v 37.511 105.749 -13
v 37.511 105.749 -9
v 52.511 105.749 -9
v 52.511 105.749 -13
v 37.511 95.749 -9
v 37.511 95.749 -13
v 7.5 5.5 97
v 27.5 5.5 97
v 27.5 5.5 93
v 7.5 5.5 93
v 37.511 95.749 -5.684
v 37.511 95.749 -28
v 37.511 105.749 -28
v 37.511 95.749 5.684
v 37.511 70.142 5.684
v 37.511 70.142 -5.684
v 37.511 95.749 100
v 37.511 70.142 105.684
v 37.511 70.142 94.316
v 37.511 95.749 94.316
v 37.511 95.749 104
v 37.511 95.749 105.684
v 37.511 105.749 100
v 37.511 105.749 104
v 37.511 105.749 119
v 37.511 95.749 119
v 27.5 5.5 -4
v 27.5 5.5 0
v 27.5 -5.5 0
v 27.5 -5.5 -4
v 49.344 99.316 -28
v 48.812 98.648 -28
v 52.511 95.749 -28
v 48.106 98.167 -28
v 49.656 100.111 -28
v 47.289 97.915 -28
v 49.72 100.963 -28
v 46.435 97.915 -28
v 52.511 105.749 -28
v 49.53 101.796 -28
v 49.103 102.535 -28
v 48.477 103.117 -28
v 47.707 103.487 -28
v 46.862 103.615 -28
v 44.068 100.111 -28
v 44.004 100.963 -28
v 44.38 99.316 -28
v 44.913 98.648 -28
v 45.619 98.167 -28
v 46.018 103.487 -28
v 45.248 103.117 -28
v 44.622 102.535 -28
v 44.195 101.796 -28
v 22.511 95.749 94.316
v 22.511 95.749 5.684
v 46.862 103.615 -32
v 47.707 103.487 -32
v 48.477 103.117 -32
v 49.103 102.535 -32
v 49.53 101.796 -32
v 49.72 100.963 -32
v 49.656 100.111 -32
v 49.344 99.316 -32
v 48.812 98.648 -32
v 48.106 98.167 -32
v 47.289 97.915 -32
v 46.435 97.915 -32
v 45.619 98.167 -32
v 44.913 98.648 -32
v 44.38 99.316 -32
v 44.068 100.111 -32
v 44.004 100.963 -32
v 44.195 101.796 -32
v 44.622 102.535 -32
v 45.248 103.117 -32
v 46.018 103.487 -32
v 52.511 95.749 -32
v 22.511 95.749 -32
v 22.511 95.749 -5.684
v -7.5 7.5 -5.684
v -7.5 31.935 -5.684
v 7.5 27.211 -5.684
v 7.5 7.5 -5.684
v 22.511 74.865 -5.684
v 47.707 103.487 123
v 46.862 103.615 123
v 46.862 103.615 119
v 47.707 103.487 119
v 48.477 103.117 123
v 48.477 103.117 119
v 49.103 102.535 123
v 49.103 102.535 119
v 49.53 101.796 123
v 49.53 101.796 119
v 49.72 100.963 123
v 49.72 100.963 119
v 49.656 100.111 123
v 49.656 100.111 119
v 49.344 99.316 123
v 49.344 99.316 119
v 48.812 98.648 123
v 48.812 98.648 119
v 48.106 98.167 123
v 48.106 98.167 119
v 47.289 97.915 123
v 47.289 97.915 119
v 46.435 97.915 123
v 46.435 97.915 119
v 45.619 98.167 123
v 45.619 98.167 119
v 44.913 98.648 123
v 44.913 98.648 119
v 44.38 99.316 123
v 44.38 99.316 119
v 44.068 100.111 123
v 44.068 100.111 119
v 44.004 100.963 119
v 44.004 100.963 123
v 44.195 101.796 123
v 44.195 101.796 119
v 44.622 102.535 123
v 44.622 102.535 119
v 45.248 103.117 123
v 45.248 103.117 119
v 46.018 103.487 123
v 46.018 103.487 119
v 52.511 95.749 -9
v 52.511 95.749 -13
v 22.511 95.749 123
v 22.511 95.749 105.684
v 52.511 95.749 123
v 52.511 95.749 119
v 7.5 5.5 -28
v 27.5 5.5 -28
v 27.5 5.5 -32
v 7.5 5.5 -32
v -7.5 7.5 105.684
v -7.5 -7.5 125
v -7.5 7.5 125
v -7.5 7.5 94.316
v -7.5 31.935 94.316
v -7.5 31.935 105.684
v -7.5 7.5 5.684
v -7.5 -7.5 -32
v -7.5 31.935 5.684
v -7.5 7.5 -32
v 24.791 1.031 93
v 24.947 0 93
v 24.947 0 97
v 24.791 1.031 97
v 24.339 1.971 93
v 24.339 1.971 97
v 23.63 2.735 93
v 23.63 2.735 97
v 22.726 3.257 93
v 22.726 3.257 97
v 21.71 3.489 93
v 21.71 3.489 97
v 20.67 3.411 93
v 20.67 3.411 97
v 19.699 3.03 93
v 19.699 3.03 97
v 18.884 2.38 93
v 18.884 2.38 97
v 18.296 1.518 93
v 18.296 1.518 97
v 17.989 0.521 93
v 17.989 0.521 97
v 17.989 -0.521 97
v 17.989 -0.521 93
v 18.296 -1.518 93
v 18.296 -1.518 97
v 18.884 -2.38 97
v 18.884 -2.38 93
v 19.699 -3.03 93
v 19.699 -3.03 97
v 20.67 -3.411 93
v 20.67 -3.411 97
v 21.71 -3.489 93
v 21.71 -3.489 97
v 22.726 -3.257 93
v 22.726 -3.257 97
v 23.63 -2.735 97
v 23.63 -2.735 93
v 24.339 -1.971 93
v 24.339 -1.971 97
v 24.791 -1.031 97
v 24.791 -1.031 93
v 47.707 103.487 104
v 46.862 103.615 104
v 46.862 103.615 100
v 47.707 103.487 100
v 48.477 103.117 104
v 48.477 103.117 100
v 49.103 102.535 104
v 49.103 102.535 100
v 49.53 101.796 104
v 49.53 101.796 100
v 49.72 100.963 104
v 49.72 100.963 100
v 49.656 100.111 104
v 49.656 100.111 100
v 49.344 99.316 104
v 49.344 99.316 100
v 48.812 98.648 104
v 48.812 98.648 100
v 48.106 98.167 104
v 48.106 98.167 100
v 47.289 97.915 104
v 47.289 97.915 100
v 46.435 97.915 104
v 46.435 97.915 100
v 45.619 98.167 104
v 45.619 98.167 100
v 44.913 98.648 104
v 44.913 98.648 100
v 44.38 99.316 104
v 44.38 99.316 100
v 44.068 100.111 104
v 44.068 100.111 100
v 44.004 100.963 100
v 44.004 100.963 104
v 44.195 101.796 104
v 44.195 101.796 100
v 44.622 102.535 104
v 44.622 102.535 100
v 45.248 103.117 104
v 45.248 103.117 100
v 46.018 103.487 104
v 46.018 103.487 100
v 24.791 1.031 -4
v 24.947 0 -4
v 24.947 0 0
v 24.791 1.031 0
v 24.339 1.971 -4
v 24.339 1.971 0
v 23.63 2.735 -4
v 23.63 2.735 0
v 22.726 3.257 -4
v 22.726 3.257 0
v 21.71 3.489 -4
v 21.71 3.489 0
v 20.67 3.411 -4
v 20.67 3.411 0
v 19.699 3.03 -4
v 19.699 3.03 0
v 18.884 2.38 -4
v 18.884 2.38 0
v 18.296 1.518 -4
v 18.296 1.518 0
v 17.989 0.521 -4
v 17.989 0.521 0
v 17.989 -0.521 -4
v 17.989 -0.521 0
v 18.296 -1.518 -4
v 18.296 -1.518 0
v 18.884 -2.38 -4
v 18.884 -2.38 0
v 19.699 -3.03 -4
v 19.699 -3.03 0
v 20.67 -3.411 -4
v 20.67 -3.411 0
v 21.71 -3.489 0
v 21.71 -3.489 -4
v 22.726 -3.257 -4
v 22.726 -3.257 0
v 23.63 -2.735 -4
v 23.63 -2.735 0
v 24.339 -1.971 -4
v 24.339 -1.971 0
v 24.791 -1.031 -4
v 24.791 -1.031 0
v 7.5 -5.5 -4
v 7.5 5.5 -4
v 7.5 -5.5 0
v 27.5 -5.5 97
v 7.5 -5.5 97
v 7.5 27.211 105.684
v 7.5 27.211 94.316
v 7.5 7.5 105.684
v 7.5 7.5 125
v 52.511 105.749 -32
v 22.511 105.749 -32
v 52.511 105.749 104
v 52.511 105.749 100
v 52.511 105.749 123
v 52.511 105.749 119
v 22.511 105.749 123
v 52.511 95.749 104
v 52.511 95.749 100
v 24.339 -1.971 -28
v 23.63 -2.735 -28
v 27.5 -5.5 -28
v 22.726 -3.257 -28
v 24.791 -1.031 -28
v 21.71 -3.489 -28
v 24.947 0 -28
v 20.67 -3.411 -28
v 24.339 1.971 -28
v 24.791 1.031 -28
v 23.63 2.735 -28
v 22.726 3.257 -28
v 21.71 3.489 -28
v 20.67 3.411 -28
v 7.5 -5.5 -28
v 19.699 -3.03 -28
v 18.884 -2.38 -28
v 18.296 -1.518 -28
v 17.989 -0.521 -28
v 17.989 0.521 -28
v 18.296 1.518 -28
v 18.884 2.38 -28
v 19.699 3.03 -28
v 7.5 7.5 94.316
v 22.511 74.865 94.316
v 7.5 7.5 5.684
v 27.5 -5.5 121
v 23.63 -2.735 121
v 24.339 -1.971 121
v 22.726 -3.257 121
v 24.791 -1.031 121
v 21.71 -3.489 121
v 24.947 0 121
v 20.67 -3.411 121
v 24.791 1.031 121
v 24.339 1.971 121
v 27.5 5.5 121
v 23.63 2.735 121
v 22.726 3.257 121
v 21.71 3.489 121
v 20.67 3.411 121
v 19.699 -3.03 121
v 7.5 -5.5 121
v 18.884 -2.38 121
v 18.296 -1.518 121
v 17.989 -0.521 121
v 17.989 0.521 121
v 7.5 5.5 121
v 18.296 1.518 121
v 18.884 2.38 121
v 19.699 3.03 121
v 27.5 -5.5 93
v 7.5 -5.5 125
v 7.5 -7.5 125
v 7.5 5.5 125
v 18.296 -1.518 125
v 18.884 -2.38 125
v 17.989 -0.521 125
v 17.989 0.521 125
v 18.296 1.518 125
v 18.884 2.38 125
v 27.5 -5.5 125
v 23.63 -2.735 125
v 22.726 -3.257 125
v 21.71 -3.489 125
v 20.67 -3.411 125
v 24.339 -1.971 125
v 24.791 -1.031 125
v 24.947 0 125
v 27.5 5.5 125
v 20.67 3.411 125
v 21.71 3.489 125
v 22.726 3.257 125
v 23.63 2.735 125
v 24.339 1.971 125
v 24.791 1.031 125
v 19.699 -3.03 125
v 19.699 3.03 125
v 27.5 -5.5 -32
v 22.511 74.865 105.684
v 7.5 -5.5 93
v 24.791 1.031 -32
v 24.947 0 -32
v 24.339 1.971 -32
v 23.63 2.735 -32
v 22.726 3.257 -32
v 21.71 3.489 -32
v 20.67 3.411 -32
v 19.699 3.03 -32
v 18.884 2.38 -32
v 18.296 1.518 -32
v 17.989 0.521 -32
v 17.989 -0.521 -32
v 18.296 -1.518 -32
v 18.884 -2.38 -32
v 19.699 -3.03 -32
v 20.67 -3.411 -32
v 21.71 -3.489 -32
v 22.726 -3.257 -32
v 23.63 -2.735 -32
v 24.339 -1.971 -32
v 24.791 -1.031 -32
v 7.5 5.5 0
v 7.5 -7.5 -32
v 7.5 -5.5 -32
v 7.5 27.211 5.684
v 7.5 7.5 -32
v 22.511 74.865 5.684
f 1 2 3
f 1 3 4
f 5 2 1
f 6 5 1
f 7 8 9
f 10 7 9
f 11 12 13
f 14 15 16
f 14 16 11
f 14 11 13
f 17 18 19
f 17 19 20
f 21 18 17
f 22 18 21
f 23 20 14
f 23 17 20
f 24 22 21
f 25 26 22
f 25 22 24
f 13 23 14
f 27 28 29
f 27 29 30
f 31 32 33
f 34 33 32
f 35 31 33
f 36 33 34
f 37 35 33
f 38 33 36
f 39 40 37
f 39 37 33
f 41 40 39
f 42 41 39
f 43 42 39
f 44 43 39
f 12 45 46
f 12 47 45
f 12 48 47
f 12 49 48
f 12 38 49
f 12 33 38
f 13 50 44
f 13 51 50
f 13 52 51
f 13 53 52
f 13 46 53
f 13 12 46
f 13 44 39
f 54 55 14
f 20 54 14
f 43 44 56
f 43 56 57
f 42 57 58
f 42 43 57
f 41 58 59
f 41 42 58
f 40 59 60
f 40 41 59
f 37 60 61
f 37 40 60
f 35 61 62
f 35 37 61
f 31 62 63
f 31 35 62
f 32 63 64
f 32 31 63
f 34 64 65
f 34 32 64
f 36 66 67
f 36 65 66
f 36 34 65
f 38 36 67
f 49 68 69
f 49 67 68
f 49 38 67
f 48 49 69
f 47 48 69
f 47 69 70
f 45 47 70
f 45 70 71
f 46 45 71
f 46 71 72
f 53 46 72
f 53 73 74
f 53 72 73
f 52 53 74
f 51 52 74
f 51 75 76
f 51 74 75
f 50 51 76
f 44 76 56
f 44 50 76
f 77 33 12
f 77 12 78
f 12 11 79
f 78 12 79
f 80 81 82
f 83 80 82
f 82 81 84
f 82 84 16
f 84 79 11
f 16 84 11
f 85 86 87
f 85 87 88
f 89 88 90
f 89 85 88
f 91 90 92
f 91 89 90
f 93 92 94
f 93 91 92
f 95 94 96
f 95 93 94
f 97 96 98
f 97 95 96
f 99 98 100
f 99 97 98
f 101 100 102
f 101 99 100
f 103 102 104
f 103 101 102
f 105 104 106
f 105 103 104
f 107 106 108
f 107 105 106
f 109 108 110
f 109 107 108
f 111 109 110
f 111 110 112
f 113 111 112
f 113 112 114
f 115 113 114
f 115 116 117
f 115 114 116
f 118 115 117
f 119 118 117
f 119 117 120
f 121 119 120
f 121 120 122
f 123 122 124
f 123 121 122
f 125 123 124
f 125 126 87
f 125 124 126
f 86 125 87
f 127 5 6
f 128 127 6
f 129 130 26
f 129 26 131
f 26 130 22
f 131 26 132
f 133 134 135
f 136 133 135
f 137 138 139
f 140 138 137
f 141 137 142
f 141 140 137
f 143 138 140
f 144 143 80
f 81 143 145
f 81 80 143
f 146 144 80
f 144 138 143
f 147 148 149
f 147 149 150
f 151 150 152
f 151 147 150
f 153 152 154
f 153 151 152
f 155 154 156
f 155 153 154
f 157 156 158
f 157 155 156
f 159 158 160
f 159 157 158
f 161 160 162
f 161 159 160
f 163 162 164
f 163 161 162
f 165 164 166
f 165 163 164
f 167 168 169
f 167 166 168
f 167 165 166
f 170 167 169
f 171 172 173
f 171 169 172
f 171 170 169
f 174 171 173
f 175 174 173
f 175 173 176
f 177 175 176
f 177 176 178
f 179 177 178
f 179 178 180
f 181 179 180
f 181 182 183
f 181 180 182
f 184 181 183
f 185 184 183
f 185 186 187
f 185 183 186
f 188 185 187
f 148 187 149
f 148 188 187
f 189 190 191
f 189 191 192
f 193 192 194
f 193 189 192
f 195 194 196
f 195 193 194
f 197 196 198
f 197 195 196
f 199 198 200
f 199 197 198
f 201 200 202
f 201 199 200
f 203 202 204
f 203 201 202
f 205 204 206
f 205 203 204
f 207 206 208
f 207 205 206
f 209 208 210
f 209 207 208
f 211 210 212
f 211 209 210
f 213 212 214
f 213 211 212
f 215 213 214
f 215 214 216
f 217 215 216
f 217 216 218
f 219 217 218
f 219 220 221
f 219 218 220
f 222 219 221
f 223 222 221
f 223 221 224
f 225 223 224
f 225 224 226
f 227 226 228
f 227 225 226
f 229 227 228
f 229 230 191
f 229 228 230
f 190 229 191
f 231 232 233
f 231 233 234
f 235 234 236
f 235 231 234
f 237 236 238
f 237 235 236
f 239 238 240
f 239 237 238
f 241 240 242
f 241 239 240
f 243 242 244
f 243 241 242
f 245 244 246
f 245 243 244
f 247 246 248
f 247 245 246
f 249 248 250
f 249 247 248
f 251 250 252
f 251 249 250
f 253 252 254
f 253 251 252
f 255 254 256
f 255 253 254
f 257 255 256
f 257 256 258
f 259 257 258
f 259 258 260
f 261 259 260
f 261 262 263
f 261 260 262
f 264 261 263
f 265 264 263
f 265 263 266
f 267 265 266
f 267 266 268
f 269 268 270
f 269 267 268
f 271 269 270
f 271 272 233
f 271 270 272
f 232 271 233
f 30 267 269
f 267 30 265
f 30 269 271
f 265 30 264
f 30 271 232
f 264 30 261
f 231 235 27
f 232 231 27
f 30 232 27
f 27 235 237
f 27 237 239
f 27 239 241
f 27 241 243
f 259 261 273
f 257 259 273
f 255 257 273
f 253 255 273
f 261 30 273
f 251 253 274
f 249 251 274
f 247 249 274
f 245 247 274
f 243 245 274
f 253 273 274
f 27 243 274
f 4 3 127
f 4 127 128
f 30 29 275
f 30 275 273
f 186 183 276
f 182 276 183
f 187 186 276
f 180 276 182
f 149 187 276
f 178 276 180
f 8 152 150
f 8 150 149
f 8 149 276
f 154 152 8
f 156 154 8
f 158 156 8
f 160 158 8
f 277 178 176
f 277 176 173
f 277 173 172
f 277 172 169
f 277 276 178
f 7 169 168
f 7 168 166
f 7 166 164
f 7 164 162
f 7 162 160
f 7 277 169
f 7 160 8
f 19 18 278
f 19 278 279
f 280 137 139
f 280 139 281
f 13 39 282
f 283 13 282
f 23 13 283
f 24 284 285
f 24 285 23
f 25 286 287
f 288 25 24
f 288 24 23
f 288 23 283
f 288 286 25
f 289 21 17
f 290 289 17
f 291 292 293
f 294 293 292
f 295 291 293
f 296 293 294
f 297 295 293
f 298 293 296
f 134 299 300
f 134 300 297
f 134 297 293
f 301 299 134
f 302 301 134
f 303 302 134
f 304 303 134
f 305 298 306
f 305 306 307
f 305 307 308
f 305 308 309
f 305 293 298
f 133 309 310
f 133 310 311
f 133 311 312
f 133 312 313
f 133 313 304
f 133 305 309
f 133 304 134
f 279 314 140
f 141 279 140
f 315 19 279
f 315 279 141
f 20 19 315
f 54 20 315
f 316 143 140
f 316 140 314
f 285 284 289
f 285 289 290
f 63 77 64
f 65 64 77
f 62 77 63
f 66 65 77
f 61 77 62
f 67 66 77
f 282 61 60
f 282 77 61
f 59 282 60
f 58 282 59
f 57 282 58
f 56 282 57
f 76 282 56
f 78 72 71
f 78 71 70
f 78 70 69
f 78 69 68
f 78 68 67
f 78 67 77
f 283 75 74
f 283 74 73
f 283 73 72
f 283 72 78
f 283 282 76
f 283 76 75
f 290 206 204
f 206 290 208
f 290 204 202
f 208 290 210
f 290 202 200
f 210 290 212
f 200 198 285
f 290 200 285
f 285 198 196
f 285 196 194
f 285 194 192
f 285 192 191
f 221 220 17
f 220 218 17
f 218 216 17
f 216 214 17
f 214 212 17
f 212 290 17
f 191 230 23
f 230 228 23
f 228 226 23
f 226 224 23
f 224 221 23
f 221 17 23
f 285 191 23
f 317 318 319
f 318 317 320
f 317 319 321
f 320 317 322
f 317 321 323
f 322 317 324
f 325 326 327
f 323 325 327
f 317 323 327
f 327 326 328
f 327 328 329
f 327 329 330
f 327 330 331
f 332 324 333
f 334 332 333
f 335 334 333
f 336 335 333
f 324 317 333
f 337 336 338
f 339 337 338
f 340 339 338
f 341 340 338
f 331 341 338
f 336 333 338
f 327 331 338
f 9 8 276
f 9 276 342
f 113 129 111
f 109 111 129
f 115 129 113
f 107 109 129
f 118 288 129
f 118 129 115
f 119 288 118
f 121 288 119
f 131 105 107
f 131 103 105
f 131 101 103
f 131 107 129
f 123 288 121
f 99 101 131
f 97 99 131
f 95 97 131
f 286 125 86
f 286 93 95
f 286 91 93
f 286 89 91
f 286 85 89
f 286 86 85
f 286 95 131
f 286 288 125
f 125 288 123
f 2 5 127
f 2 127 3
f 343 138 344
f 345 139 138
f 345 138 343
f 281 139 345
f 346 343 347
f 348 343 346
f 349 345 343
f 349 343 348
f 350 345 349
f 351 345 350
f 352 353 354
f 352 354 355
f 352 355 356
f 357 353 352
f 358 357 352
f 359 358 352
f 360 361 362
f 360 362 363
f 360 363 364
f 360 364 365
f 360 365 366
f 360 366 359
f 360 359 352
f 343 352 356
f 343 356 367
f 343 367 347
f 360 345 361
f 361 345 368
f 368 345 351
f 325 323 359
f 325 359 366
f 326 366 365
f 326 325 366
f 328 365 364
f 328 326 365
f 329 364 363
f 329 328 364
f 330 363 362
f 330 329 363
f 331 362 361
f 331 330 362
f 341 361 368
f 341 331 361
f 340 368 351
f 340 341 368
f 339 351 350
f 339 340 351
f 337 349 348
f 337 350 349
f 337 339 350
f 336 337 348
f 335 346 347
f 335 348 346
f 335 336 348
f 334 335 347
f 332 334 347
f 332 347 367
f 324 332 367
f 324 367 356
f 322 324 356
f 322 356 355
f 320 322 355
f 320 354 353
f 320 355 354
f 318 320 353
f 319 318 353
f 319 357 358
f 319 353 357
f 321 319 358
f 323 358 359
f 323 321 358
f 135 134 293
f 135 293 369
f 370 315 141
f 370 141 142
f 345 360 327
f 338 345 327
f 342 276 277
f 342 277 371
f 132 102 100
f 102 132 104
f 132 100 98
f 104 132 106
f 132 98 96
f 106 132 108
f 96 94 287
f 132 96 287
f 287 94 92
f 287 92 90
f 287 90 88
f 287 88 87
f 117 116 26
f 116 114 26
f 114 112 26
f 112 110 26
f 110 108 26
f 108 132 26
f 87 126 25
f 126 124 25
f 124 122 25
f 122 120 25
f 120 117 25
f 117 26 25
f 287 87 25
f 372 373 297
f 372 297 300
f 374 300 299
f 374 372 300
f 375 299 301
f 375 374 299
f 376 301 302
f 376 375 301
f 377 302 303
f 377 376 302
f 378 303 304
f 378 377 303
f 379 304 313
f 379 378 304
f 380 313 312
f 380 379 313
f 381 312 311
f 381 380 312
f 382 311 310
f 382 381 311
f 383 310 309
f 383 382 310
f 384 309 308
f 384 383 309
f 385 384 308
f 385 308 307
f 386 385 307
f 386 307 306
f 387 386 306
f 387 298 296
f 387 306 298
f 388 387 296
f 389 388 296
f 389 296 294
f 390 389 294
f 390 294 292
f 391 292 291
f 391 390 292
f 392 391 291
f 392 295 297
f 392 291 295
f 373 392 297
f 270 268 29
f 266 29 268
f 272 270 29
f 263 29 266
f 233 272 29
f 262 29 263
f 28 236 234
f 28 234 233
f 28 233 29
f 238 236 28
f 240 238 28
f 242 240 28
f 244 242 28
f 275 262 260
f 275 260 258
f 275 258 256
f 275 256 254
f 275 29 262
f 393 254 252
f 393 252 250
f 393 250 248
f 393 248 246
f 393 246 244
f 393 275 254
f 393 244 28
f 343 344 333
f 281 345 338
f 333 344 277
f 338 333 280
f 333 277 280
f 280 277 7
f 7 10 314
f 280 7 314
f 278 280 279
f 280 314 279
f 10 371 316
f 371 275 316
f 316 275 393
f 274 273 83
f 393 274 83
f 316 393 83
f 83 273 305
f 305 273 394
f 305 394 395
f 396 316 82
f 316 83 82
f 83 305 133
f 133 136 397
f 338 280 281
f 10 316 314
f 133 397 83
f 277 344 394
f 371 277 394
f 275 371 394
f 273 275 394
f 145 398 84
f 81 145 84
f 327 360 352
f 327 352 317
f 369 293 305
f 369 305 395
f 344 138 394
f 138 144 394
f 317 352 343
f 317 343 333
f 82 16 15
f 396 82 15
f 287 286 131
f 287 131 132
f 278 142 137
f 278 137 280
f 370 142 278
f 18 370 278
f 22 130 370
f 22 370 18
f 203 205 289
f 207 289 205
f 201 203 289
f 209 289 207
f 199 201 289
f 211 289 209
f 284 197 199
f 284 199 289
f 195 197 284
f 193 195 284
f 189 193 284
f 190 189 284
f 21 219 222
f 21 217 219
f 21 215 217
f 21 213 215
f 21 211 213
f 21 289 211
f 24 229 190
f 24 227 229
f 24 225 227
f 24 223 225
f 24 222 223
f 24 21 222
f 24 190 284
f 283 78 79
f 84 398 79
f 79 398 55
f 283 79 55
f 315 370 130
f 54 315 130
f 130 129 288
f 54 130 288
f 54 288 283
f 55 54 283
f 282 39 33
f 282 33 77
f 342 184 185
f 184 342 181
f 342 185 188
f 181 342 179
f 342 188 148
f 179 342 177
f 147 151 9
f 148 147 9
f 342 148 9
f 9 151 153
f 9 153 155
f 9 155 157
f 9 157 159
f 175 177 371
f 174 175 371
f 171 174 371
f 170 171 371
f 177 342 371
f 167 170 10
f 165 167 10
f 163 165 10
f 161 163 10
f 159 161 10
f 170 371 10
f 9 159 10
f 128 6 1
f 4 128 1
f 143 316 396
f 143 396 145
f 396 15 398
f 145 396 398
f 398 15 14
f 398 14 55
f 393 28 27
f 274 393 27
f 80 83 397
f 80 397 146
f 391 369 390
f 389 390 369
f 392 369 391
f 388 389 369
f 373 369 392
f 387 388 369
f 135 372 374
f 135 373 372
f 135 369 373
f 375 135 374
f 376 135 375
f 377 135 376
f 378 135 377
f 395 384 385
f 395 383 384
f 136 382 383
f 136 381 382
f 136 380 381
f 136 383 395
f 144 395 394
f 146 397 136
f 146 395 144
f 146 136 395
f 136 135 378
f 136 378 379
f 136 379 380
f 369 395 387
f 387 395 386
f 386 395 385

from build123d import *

# Parameters (mm, degrees)
SKETCH1_W               = 15
SKETCH1_H               = 15
BOSS_EXTRUDE1_DEPTH     = 100
SKETCH6_W               = 15
SKETCH6_H               = 11.367788058
SKETCH9_W               = 15
SKETCH9_H               = 10
BOSS_EXTRUDE3_DEPTH     = 88.632211942
SKETCH10_W              = 4
SKETCH10_H              = 11
BOSS_EXTRUDE4_DEPTH     = 20
SKETCH13_W              = 15
SKETCH13_H              = 15
BOSS_EXTRUDE5_DEPTH     = 26.316105971
SKETCH14_W              = 15
SKETCH14_H              = 15
BOSS_EXTRUDE6_DEPTH     = 19.316105971
CUT_EXTRUDE1_DEPTH      = 171.970297301
CUT_EXTRUDE1_DEPTH_BACK = 171.970297301
SKETCH11_R              = 3.498600433
SKETCH15_W              = 4
SKETCH15_H              = 10
BOSS_EXTRUDE7_DEPTH     = 15
SKETCH17_W              = 15
SKETCH17_H              = 10
BOSS_EXTRUDE8_DEPTH     = 17.316105971
SKETCH18_W              = 15
SKETCH18_H              = 10
BOSS_EXTRUDE9_DEPTH     = 26.316105971
CUT_EXTRUDE2_DEPTH      = 197.441252703
CUT_EXTRUDE2_DEPTH_BACK = 197.441252703
SKETCH19_R              = 2.865816397


with BuildPart() as part:
    # Sketch1 → Boss-Extrude1 (new body)
    with BuildSketch(Plane.XY):
        Rectangle(SKETCH1_W, SKETCH1_H)
    extrude(amount=BOSS_EXTRUDE1_DEPTH)



with BuildPart() as body_2:
    # Sweep2: sweep along a path in Sketch5
    with BuildLine(Plane.XY) as sweep2_path:
        Line((0, -7.5), (0, 29.573046855))
        Line((0, 29.573046855), (30.010773466, 72.503120051))
        Line((30.010773466, 72.503120051), (30.010773466, 105.748685256))
    # Sketch6 → Sweep2 (sweep)
    with BuildSketch(Plane.XZ.offset(7.5)):
        Rectangle(SKETCH6_W, SKETCH6_H)
    sweep(path=sweep2_path.line, transition=Transition.RIGHT)


with BuildPart() as body_3:
    # Mirror1: mirrored copy
    add(body_2.part.mirror(Plane(origin=(0, 0, 50), x_dir=(1, 0, 0), z_dir=(0, 0, -1))))


with BuildPart() as body_2_1:
    add(body_2.part)

    add(body_3.part)  # Boss-Extrude3 merges body 3
    # Sketch9 → Boss-Extrude3 (add)
    with BuildSketch(Plane.XY.offset(5.683894029)):
        with Locations((30.010773466, 100.748685256)):
            Rectangle(SKETCH9_W, SKETCH9_H)
    extrude(amount=BOSS_EXTRUDE3_DEPTH)


with BuildPart() as part_1:
    add(part.part)

    add(body_2_1.part)  # Boss-Extrude4 merges body 2
    # Sketch10 → Boss-Extrude4 (add)
    with BuildSketch(Plane(origin=(7.5, 0, 0), x_dir=(0, 0, -1), z_dir=(1, 0, 0))):
        with Locations((-123, 0)):
            Rectangle(SKETCH10_W, SKETCH10_H)
        with Locations((-95, 0)):
            Rectangle(SKETCH10_W, SKETCH10_H)
        with Locations((2, 0)):
            Rectangle(SKETCH10_W, SKETCH10_H)
        with Locations((30, 0)):
            Rectangle(SKETCH10_W, SKETCH10_H)
    extrude(amount=BOSS_EXTRUDE4_DEPTH)

    # Sketch13 → Boss-Extrude5 (add)
    with BuildSketch(Plane(origin=(0, 0, -5.683894029), x_dir=(-1, 0, 0), z_dir=(0, 0, -1))):
        Rectangle(SKETCH13_W, SKETCH13_H)
    extrude(amount=BOSS_EXTRUDE5_DEPTH)

    # Sketch14 → Boss-Extrude6 (add)
    with BuildSketch(Plane.XY.offset(105.683894029)):
        Rectangle(SKETCH14_W, SKETCH14_H)
    extrude(amount=BOSS_EXTRUDE6_DEPTH)

    # Sketch11 → Cut-Extrude1 (cut, two sides: drawn at the far end of the back side and taken through both)
    with BuildSketch(Plane.XY.offset(97).offset(-CUT_EXTRUDE1_DEPTH_BACK)):
        with Locations((21.44815937, 0)):
            Circle(SKETCH11_R)
    extrude(amount=CUT_EXTRUDE1_DEPTH + CUT_EXTRUDE1_DEPTH_BACK, mode=Mode.SUBTRACT)

    # Sketch15 → Boss-Extrude7 (add)
    with BuildSketch(Plane(origin=(37.510773466, 0, 0), x_dir=(0, 0, -1), z_dir=(1, 0, 0))):
        with Locations((-121, 100.748685256)):
            Rectangle(SKETCH15_W, SKETCH15_H)
        with Locations((-102, 100.748685256)):
            Rectangle(SKETCH15_W, SKETCH15_H)
        with Locations((11, 100.748685256)):
            Rectangle(SKETCH15_W, SKETCH15_H)
        with Locations((30, 100.748685256)):
            Rectangle(SKETCH15_W, SKETCH15_H)
    extrude(amount=BOSS_EXTRUDE7_DEPTH)


with BuildPart() as boss_extrude7_piece_1:
    # of the separate pieces the step leaves, piece 1, a body of its own (boss_extrude7_pieces)
    add(part_1.part.solids().sort_by_distance((-7.5, 7.5, -5.683894029))[0])



with BuildPart() as boss_extrude7_piece_2:
    # of the separate pieces the step leaves, piece 2, a body of its own (boss_extrude7_pieces)
    add(part_1.part.solids().sort_by_distance((37.510773466, 95.748685256, 119))[0])


with BuildPart() as boss_extrude7_piece_3:
    # of the separate pieces the step leaves, piece 3, a body of its own (boss_extrude7_pieces)
    add(part_1.part.solids().sort_by_distance((37.510773466, 95.748685256, -32))[0])


with BuildPart() as boss_extrude7_piece_4:
    # of the separate pieces the step leaves, piece 4, a body of its own (boss_extrude7_pieces)
    add(part_1.part.solids().sort_by_distance((37.510773466, 95.748685256, -13))[0])


with BuildPart() as boss_extrude7_piece_1_1:
    add(boss_extrude7_piece_1.part)

    add(boss_extrude7_piece_2.part)  # Boss-Extrude8 merges Boss-Extrude7 piece 2
    # Sketch17 → Boss-Extrude8 (add)
    with BuildSketch(Plane.XY.offset(105.683894029)):
        with Locations((30.010773466, 100.748685256)):
            Rectangle(SKETCH17_W, SKETCH17_H)
    extrude(amount=BOSS_EXTRUDE8_DEPTH)


    add(boss_extrude7_piece_3.part)  # Boss-Extrude9 merges Boss-Extrude7 piece 3
    # Sketch18 → Boss-Extrude9 (add)
    with BuildSketch(Plane(origin=(0, 0, -5.683894029), x_dir=(-1, 0, 0), z_dir=(0, 0, -1))):
        with Locations((-30.010773466, 100.748685256)):
            Rectangle(SKETCH18_W, SKETCH18_H)
    extrude(amount=BOSS_EXTRUDE9_DEPTH)

    # Sketch19 → Cut-Extrude2 (cut, two sides: drawn at the far end of the back side and taken through both)
    with BuildSketch(Plane(origin=(0, 0, -32), x_dir=(-1, 0, 0), z_dir=(0, 0, -1)).offset(-CUT_EXTRUDE2_DEPTH_BACK)):
        with Locations(Location((-46.862290346, 100.748685256, 0), (0, 0, 90))):
            Circle(SKETCH19_R)
    extrude(amount=CUT_EXTRUDE2_DEPTH + CUT_EXTRUDE2_DEPTH_BACK, mode=Mode.SUBTRACT)


solid = Compound([boss_extrude7_piece_4.part, boss_extrude7_piece_1_1.part])
